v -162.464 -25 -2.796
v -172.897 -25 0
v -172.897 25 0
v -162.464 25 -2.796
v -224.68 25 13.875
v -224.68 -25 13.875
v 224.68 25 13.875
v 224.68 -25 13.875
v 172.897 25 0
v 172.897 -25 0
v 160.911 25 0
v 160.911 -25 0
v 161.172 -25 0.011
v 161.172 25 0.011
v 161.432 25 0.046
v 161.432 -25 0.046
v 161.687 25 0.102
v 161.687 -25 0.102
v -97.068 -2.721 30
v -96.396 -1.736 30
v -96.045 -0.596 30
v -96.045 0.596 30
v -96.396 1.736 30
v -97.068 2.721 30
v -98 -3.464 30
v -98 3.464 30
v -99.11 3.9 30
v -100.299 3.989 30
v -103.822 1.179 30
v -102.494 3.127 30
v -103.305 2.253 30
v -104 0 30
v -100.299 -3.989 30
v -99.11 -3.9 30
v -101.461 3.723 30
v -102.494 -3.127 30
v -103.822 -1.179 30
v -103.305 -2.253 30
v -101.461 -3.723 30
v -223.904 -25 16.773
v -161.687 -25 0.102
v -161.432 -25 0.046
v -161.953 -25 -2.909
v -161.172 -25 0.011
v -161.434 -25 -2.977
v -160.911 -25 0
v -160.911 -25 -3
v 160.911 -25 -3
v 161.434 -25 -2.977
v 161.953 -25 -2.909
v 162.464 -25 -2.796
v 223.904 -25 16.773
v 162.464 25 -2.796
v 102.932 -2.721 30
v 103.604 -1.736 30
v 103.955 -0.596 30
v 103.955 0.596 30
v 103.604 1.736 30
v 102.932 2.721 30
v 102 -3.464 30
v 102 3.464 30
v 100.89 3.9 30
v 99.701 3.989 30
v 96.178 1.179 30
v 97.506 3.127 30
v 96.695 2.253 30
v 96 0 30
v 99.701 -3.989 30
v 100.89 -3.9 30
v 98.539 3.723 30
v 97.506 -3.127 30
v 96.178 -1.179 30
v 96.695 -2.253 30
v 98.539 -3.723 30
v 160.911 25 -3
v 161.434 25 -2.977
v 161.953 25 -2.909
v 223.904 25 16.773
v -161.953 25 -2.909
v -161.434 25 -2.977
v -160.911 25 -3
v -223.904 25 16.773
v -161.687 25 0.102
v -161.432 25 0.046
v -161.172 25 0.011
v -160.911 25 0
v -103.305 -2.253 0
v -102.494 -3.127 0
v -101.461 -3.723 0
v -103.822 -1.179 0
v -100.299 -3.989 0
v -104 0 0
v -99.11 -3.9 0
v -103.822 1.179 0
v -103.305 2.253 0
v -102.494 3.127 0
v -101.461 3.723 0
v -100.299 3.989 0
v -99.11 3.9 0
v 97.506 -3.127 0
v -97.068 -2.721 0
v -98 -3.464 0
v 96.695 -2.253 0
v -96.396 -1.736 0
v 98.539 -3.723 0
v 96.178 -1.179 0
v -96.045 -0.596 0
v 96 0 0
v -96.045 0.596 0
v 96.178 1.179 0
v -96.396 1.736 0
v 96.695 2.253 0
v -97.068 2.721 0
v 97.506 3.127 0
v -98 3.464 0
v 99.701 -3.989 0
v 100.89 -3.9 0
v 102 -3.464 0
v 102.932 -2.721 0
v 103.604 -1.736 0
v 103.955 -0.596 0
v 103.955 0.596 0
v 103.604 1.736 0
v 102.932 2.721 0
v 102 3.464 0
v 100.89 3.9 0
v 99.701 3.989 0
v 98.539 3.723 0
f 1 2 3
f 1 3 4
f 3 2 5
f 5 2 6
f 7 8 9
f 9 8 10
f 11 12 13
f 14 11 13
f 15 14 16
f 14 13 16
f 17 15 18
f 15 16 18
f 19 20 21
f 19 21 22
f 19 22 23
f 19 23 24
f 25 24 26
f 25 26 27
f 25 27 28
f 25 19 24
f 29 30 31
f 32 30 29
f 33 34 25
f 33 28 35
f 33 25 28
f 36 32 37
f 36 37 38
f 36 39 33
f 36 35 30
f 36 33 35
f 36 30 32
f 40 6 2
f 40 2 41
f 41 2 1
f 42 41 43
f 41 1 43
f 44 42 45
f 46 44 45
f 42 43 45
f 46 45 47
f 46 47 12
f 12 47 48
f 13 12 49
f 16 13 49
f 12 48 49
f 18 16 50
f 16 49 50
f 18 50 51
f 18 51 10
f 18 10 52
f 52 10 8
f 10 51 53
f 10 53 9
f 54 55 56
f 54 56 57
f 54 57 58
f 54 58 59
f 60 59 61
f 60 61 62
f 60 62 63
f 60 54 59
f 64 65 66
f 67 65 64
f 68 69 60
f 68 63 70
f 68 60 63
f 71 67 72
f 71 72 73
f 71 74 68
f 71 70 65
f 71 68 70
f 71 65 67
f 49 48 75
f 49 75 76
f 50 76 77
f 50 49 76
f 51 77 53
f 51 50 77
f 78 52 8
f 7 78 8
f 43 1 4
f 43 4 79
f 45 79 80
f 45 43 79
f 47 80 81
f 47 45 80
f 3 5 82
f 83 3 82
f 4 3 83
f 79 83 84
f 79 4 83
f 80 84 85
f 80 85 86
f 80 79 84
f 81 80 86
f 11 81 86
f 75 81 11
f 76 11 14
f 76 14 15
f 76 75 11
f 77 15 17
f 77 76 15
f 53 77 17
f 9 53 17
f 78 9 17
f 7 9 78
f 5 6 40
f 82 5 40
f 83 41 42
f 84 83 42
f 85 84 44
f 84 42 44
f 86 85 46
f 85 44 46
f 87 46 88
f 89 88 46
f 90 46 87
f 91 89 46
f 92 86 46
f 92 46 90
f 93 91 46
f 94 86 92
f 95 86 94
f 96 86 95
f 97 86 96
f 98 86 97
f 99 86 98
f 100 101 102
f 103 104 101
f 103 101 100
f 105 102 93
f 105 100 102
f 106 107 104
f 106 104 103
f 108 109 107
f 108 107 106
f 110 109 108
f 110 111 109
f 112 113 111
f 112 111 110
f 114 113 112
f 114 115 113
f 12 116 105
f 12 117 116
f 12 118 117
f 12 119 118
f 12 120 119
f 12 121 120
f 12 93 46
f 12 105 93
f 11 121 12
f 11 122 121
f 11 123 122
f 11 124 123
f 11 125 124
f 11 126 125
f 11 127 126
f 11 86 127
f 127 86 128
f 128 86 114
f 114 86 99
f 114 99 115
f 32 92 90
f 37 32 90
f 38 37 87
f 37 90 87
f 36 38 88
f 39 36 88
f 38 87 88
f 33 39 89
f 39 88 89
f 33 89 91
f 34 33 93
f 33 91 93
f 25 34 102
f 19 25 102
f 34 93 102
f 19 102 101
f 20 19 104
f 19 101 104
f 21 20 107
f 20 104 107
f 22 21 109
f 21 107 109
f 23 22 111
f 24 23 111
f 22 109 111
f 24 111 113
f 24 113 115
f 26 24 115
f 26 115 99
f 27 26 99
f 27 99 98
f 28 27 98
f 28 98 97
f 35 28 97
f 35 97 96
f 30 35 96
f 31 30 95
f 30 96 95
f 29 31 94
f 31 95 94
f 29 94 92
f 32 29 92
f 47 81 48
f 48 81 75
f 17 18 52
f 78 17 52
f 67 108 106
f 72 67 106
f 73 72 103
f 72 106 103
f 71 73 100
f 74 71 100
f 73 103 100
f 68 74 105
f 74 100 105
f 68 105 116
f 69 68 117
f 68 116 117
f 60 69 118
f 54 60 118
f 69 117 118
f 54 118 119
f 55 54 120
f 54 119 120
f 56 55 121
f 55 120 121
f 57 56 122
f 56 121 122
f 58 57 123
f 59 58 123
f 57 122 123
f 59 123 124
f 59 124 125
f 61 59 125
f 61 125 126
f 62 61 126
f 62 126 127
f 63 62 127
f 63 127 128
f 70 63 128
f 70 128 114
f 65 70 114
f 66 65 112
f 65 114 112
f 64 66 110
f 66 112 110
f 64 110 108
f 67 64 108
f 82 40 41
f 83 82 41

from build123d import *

# Parameters (mm, degrees)
SKETCH1_W              = 453
SKETCH1_H              = 50
BASE_FLANGE1_DEPTH     = 3
SKETCHED_START         = -25
SKETCHED_BEND1_DEPTH   = 50
SKETCHED_BEND1_2_DEPTH = 50
SKETCH7_R              = 4
BOSS_EXTRUDE1_DEPTH    = 30


# Read off the part's stored shape, not the designer's step: Sketched Bend1
# Sheet-metal steps are written as plain solids
with BuildPart() as part:
    # Sketch1 → Base-Flange1 (new body)
    with BuildSketch(Plane.XY):
        Rectangle(SKETCH1_W, SKETCH1_H)
    extrude(amount=-BASE_FLANGE1_DEPTH)

    # Sketched Bend1 outline → Sketched Bend1 (cut)
    with BuildSketch(Plane(origin=(0, 0, 0), x_dir=(1, 0, 0), z_dir=(0, 1, 0)).offset(SKETCHED_START)):
        with BuildLine():
            ThreePointArc((-162.463865648, 2.795554958), (-161.69410853, 2.948669168), (-160.910951377, 3))
            Line((-160.910951377, 3), (-226.5, 3))
            Line((-226.5, 3), (-226.5, 0))
            Line((-226.5, 0), (-172.897018786, 0))
            Line((-172.897018786, 0), (-162.463865648, 2.795554958))
        make_face()
        with BuildLine():
            Line((226.5, 3), (160.910951377, 3))
            ThreePointArc((160.910951377, 3), (161.69410853, 2.948669168), (162.463865648, 2.795554958))
            Line((162.463865648, 2.795554958), (172.897018786, 0))
            Line((172.897018786, 0), (226.5, 0))
            Line((226.5, 0), (226.5, 3))
        make_face()
    extrude(amount=SKETCHED_BEND1_DEPTH, mode=Mode.SUBTRACT)

    # Sketched Bend1 2 outline → Sketched Bend1 2 (add)
    with BuildSketch(Plane(origin=(0, 0, 0), x_dir=(1, 0, 0), z_dir=(0, 1, 0)).offset(SKETCHED_START)):
        with BuildLine():
            Line((-160.910951377, 0), (-172.897018786, 0))
            Line((-172.897018786, 0), (-224.680067079, -13.875225972))
            Line((-224.680067079, -13.875225972), (-223.903609944, -16.773003451))
            Line((-223.903609944, -16.773003451), (-161.687408513, -0.102222521))
            ThreePointArc((-161.687408513, -0.102222521), (-161.302529954, -0.025665416), (-160.910951377, 0))
        make_face()
        with BuildLine():
            Line((224.680067079, -13.875225972), (172.897018786, 0))
            Line((172.897018786, 0), (160.910951377, 0))
            ThreePointArc((160.910951377, 0), (161.302529954, -0.025665416), (161.687408513, -0.102222521))
            Line((161.687408513, -0.102222521), (223.903609944, -16.773003451))
            Line((223.903609944, -16.773003451), (224.680067079, -13.875225972))
        make_face()
    extrude(amount=SKETCHED_BEND1_2_DEPTH)

    # Sketch7 → Boss-Extrude1 (add)
    with BuildSketch(Plane.XY):
        with Locations(Location((-100, 0, 0), (0, 0, 180))):
            Circle(SKETCH7_R)
        with Locations(Location((100, 0, 0), (0, 0, 180))):
            Circle(SKETCH7_R)
    extrude(amount=BOSS_EXTRUDE1_DEPTH)


solid = part.part
